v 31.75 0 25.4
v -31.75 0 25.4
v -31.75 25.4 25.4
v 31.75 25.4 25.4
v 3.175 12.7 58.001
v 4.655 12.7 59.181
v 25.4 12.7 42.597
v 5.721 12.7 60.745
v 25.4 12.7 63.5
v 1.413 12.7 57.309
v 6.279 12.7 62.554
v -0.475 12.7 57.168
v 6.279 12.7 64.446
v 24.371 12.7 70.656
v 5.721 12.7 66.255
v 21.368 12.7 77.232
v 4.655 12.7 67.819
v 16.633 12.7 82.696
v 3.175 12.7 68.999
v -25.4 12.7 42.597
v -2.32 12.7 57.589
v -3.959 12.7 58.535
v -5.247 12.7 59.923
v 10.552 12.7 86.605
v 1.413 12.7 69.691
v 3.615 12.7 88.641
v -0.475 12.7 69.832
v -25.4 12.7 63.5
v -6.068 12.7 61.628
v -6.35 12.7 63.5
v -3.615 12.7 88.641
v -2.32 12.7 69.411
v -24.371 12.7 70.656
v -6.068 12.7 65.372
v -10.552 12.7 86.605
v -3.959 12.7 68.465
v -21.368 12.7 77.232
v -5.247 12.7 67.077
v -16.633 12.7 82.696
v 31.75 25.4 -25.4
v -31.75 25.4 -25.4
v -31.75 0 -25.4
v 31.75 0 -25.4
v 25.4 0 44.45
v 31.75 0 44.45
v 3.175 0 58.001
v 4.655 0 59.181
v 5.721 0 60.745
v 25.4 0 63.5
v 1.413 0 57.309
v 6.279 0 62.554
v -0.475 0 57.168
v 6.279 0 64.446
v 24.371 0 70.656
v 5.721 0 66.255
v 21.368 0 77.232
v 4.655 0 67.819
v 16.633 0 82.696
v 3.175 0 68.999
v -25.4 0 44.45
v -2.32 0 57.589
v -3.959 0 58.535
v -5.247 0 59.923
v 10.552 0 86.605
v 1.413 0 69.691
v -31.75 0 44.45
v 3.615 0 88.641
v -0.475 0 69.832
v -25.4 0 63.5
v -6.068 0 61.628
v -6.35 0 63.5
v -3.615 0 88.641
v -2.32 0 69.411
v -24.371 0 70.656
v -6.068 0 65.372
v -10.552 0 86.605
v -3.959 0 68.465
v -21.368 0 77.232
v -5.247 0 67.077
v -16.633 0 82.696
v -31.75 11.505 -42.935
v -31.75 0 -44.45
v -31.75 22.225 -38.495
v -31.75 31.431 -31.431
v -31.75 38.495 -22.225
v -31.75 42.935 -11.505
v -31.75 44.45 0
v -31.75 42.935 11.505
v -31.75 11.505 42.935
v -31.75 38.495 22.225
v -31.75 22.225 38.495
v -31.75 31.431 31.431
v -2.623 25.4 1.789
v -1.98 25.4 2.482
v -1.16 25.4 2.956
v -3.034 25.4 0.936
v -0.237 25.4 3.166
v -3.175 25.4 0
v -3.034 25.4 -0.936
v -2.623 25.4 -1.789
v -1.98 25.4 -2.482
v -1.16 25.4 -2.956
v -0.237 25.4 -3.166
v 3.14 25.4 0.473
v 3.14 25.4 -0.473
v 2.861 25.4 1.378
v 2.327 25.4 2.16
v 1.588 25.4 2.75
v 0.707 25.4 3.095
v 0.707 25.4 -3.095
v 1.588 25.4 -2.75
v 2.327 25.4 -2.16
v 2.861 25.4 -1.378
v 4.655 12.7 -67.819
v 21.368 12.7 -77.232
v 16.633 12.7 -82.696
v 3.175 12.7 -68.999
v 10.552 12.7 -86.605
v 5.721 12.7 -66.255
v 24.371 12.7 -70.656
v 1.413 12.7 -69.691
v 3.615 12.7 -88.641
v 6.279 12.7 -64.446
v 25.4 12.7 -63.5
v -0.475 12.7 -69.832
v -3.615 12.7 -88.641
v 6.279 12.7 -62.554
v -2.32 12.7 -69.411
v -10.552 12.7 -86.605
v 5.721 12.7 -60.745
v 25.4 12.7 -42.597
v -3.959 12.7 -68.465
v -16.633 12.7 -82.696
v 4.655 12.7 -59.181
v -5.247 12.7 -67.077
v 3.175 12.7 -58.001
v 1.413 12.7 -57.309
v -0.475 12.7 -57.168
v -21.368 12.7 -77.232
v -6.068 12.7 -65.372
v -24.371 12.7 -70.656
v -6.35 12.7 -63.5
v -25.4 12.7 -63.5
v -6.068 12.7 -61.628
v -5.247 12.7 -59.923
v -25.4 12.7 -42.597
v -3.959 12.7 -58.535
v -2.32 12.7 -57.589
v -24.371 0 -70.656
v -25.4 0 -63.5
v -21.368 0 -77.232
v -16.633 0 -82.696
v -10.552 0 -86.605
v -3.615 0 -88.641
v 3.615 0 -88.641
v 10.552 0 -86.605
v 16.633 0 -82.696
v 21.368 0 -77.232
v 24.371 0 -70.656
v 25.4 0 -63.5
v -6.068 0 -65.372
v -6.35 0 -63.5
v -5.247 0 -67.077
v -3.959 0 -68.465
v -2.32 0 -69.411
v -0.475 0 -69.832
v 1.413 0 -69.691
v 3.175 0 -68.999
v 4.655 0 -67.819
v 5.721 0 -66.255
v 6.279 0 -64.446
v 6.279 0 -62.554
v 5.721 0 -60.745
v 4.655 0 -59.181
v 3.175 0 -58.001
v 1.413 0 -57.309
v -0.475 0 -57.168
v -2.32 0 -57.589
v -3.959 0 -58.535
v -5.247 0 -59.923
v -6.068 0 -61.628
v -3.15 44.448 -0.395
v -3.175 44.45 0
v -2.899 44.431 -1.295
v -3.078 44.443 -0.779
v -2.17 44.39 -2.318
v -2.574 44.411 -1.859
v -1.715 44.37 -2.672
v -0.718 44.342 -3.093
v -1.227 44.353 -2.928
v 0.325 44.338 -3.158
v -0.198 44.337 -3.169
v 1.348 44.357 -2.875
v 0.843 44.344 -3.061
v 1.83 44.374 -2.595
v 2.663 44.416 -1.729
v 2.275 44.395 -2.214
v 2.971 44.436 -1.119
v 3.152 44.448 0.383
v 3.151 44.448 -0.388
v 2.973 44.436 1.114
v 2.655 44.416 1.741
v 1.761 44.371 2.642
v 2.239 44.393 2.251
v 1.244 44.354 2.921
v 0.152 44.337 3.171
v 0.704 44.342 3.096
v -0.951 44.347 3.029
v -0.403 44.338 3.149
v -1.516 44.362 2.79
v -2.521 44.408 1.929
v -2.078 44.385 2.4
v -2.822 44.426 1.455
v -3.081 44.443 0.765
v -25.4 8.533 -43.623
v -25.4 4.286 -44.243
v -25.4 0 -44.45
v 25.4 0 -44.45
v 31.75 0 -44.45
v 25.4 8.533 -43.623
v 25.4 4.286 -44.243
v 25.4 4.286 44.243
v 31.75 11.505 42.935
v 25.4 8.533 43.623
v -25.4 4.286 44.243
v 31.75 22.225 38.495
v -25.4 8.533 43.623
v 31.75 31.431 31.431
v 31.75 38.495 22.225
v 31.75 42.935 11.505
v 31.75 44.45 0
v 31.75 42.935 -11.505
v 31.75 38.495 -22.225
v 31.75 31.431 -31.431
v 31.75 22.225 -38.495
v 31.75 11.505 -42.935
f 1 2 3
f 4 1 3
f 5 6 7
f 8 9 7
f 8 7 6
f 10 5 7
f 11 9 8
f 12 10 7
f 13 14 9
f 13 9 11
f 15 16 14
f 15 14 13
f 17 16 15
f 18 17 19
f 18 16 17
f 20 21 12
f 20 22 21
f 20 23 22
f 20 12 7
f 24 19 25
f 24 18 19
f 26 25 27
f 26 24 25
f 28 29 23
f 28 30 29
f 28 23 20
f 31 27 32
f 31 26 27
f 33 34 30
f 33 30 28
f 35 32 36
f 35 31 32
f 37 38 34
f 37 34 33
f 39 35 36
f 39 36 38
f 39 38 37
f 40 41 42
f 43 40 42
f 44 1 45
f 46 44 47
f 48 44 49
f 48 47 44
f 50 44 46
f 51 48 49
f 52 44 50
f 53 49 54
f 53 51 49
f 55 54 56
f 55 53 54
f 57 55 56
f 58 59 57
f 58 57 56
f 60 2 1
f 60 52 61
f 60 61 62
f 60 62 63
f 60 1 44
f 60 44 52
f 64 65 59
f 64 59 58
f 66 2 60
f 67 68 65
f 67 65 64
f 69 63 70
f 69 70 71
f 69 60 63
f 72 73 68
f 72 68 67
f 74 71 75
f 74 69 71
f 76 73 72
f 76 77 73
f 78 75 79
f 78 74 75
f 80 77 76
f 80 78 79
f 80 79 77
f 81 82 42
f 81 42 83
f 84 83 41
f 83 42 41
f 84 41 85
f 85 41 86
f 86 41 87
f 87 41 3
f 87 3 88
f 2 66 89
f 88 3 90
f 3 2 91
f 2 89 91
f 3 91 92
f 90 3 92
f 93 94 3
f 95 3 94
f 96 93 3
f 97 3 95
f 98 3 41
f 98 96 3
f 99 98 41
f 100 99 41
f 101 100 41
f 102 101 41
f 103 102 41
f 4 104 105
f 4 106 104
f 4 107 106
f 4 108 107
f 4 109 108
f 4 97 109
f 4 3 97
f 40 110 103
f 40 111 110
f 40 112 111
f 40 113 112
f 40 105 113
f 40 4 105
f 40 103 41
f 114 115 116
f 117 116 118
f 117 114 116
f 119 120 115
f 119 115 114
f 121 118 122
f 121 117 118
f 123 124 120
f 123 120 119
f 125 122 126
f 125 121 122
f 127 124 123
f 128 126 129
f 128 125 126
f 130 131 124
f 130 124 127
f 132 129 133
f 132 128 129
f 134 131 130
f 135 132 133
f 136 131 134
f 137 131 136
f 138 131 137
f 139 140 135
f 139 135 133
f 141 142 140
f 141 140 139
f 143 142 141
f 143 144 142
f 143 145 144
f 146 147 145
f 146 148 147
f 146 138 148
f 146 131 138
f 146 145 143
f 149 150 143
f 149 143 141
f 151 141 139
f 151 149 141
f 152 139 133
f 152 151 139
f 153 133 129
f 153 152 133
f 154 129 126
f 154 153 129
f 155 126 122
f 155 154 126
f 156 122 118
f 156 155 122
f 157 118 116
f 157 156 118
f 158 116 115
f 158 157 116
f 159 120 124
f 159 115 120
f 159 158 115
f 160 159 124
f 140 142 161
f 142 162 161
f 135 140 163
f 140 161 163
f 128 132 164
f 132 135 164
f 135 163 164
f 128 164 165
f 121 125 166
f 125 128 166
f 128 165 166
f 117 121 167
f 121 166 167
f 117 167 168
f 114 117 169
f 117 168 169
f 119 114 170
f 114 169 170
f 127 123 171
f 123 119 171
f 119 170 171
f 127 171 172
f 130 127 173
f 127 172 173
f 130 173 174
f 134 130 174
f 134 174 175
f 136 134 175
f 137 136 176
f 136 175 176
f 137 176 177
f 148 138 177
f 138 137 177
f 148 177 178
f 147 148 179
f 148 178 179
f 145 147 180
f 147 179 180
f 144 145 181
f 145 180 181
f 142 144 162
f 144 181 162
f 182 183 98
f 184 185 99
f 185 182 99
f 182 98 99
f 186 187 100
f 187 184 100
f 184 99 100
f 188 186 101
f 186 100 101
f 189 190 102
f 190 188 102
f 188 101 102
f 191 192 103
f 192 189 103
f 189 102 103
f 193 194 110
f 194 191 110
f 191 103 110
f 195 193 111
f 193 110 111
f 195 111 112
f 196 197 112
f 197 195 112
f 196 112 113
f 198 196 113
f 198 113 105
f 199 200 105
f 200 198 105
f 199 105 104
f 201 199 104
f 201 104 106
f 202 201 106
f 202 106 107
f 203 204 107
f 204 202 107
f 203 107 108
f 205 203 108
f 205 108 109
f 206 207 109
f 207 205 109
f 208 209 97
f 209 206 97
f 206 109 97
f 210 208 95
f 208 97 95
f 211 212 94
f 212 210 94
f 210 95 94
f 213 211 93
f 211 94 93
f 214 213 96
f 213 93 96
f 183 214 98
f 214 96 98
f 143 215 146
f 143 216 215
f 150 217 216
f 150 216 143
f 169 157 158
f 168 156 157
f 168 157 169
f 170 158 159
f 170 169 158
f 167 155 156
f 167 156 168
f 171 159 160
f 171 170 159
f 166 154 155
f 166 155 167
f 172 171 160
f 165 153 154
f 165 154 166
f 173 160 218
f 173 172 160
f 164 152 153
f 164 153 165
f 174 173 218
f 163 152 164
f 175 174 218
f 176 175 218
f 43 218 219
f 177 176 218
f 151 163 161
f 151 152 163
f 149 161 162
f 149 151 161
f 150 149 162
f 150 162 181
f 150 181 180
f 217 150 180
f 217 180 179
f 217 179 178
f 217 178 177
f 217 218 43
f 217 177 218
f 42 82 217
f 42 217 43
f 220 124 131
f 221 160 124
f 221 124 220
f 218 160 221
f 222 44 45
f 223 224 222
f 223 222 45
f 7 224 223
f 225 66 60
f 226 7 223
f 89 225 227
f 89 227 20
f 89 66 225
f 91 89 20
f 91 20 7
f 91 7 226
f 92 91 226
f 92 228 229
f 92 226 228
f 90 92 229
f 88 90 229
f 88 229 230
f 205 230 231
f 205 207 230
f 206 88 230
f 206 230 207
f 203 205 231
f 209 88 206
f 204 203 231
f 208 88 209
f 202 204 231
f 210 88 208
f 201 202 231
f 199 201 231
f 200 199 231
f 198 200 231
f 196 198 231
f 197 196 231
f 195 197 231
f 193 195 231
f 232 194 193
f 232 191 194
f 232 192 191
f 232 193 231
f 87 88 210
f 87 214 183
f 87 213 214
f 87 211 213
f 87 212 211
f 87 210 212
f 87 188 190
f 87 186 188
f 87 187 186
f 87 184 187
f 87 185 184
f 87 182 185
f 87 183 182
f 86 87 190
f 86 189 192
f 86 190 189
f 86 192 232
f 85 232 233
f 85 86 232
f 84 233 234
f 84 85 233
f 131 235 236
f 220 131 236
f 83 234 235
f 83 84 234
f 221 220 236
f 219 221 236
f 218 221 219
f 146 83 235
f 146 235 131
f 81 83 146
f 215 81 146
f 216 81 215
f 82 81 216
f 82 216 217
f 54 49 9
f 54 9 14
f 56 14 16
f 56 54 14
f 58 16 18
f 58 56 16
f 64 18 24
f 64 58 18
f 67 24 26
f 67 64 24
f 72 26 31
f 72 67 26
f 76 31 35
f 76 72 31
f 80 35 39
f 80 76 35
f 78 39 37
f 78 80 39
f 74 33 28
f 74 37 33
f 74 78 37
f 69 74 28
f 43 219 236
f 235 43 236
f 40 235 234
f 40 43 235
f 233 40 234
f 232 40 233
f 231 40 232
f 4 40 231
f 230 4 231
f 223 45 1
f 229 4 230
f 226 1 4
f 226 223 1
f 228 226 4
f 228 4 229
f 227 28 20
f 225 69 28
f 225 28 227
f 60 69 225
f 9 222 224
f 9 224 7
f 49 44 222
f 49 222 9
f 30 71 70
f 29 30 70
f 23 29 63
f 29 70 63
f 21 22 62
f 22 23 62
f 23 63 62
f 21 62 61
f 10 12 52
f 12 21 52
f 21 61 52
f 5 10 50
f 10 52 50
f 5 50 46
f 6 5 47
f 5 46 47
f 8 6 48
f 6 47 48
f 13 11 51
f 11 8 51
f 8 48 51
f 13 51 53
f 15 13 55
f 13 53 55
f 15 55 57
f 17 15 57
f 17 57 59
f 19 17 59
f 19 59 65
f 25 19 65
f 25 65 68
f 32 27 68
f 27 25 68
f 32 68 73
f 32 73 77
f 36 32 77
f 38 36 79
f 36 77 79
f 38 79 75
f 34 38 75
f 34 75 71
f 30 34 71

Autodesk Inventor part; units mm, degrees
ref_plane "YZ Plane" through (0, 0, 0) normal (1, 0, 0) x (0, 1, 0)
ref_plane "XZ Plane" through (0, 0, 0) normal (0, 1, 0) x (-1, 0, 0)
ref_plane "XY Plane" through (0, 0, 0) normal (0, 0, 1) x (1, 0, 0)
sketch "Sketch1" plane through (0, 0, 0) normal (0, 1, 0) x (-1, 0, 0)
  line L0 (0, 88.9) -> (0, -88.9) construction
  line L1 (25.4, 63.5) -> (25.4, -63.5)
  line L2 (-25.4, -63.5) -> (-25.4, 63.5)
  arc A0 (25.4, 63.5) -> (-25.4, 63.5) centre (0, 63.5) ccw
  arc A1 (-25.4, -63.5) -> (25.4, -63.5) centre (0, -63.5) ccw
  circle A2 centre (0, 63.5) radius 6.35
  circle A3 centre (0, -63.5) radius 6.35
  point P0 (0, 0)
  point P1 (0, 0)
  dimension "d0" = 127
  dimension "d1" = 12.7
  dimension "d2" = 12.7
  dimension "d3" = 25.4
extrude "BASE" add sketch "Sketch1" along normal blind 12.7
sketch "Sketch2" plane through (0, 0, 0) normal (1, 0, 0) x (0, 1, 0)
  arc A0 (0, -44.45) -> (0, 44.45) centre (0, 0) ccw
  arc A1 (0, -31.75) -> (0, 31.75) centre (0, 0) ccw
  line L0 (0, -63.5) -> (0, 63.5) projected
  line L1 (0, 31.75) -> (15.875, 31.75)
  line L2 (15.875, 31.75) -> (15.875, -31.75)
  line L3 (15.875, -31.75) -> (0, -31.75)
  line L4 (0, -31.75) -> (0, 31.75)
  line L5 (0, 63.5) -> (0, -63.5) projected
  point P0 (7.9375, -31.75)
  point P1 (0, 0)
  point P2 (15.875, -27.4963)
  point P3 (15.875, 27.4963)
  point P4 (0, -31.75)
  dimension "d7" = 44.45
  dimension "d8" = 31.75
  dimension "d16" = 63.5
  dimension "d17" = 31.75
  dimension "d18" = 15.875
extrude "REMOVED CENTER OF BASE" cut sketch "Sketch2" along normal through all both and the other way through all
extrude "ARCH" add sketch "Sketch2" along normal mid plane 63.5
sketch "Sketch3" plane through (0, 0, 0) normal (0, 1, 0) x (-1, 0, 0)
  circle A0 centre (0, 0) radius 3.175
  dimension "d13" = 6.35
extrude "TOPHOLE" cut sketch "Sketch3" along normal through all
sketch "Sketch5" plane through (31.75, 0, 0) normal (1, 0, 0) x (0, 0, -1)
  line L0 (-44.45, 0) -> (44.45, 0) projected
  circle A0 centre (0, 0) radius 31.75
  point P0 (-31.75, 0)
  dimension "d26" = 31.75
extrude "CIRCULAR" [suppressed]
sketch "Sketch6" plane through (31.75, 0, 0) normal (1, 0, 0) x (0, 0, -1)
  line L0 (-25.4, 25.4) -> (25.4, 25.4)
  line L1 (25.4, 25.4) -> (25.4, 0)
  line L2 (25.4, 0) -> (-25.4, 0)
  line L3 (-25.4, 0) -> (-25.4, 25.4)
  point P0 (0, 0)
  point P1 (0, 0)
  point P2 (0, 0)
  dimension "d23" = 50.8
  dimension "d24" = 25.4
  dimension "d25" = 25.4
extrude "SQUARE" cut sketch "Sketch6" against normal through all
equation "\"d2\" = d1"
equation "\"d17\" = 0.5 * d16"
equation "\"d11\" = d16"
equation "\"d24\" = 0.5 * d23"
properties part number "ANS7S-TUT-BK" material "Brass, Soft Yellow, Welded"
